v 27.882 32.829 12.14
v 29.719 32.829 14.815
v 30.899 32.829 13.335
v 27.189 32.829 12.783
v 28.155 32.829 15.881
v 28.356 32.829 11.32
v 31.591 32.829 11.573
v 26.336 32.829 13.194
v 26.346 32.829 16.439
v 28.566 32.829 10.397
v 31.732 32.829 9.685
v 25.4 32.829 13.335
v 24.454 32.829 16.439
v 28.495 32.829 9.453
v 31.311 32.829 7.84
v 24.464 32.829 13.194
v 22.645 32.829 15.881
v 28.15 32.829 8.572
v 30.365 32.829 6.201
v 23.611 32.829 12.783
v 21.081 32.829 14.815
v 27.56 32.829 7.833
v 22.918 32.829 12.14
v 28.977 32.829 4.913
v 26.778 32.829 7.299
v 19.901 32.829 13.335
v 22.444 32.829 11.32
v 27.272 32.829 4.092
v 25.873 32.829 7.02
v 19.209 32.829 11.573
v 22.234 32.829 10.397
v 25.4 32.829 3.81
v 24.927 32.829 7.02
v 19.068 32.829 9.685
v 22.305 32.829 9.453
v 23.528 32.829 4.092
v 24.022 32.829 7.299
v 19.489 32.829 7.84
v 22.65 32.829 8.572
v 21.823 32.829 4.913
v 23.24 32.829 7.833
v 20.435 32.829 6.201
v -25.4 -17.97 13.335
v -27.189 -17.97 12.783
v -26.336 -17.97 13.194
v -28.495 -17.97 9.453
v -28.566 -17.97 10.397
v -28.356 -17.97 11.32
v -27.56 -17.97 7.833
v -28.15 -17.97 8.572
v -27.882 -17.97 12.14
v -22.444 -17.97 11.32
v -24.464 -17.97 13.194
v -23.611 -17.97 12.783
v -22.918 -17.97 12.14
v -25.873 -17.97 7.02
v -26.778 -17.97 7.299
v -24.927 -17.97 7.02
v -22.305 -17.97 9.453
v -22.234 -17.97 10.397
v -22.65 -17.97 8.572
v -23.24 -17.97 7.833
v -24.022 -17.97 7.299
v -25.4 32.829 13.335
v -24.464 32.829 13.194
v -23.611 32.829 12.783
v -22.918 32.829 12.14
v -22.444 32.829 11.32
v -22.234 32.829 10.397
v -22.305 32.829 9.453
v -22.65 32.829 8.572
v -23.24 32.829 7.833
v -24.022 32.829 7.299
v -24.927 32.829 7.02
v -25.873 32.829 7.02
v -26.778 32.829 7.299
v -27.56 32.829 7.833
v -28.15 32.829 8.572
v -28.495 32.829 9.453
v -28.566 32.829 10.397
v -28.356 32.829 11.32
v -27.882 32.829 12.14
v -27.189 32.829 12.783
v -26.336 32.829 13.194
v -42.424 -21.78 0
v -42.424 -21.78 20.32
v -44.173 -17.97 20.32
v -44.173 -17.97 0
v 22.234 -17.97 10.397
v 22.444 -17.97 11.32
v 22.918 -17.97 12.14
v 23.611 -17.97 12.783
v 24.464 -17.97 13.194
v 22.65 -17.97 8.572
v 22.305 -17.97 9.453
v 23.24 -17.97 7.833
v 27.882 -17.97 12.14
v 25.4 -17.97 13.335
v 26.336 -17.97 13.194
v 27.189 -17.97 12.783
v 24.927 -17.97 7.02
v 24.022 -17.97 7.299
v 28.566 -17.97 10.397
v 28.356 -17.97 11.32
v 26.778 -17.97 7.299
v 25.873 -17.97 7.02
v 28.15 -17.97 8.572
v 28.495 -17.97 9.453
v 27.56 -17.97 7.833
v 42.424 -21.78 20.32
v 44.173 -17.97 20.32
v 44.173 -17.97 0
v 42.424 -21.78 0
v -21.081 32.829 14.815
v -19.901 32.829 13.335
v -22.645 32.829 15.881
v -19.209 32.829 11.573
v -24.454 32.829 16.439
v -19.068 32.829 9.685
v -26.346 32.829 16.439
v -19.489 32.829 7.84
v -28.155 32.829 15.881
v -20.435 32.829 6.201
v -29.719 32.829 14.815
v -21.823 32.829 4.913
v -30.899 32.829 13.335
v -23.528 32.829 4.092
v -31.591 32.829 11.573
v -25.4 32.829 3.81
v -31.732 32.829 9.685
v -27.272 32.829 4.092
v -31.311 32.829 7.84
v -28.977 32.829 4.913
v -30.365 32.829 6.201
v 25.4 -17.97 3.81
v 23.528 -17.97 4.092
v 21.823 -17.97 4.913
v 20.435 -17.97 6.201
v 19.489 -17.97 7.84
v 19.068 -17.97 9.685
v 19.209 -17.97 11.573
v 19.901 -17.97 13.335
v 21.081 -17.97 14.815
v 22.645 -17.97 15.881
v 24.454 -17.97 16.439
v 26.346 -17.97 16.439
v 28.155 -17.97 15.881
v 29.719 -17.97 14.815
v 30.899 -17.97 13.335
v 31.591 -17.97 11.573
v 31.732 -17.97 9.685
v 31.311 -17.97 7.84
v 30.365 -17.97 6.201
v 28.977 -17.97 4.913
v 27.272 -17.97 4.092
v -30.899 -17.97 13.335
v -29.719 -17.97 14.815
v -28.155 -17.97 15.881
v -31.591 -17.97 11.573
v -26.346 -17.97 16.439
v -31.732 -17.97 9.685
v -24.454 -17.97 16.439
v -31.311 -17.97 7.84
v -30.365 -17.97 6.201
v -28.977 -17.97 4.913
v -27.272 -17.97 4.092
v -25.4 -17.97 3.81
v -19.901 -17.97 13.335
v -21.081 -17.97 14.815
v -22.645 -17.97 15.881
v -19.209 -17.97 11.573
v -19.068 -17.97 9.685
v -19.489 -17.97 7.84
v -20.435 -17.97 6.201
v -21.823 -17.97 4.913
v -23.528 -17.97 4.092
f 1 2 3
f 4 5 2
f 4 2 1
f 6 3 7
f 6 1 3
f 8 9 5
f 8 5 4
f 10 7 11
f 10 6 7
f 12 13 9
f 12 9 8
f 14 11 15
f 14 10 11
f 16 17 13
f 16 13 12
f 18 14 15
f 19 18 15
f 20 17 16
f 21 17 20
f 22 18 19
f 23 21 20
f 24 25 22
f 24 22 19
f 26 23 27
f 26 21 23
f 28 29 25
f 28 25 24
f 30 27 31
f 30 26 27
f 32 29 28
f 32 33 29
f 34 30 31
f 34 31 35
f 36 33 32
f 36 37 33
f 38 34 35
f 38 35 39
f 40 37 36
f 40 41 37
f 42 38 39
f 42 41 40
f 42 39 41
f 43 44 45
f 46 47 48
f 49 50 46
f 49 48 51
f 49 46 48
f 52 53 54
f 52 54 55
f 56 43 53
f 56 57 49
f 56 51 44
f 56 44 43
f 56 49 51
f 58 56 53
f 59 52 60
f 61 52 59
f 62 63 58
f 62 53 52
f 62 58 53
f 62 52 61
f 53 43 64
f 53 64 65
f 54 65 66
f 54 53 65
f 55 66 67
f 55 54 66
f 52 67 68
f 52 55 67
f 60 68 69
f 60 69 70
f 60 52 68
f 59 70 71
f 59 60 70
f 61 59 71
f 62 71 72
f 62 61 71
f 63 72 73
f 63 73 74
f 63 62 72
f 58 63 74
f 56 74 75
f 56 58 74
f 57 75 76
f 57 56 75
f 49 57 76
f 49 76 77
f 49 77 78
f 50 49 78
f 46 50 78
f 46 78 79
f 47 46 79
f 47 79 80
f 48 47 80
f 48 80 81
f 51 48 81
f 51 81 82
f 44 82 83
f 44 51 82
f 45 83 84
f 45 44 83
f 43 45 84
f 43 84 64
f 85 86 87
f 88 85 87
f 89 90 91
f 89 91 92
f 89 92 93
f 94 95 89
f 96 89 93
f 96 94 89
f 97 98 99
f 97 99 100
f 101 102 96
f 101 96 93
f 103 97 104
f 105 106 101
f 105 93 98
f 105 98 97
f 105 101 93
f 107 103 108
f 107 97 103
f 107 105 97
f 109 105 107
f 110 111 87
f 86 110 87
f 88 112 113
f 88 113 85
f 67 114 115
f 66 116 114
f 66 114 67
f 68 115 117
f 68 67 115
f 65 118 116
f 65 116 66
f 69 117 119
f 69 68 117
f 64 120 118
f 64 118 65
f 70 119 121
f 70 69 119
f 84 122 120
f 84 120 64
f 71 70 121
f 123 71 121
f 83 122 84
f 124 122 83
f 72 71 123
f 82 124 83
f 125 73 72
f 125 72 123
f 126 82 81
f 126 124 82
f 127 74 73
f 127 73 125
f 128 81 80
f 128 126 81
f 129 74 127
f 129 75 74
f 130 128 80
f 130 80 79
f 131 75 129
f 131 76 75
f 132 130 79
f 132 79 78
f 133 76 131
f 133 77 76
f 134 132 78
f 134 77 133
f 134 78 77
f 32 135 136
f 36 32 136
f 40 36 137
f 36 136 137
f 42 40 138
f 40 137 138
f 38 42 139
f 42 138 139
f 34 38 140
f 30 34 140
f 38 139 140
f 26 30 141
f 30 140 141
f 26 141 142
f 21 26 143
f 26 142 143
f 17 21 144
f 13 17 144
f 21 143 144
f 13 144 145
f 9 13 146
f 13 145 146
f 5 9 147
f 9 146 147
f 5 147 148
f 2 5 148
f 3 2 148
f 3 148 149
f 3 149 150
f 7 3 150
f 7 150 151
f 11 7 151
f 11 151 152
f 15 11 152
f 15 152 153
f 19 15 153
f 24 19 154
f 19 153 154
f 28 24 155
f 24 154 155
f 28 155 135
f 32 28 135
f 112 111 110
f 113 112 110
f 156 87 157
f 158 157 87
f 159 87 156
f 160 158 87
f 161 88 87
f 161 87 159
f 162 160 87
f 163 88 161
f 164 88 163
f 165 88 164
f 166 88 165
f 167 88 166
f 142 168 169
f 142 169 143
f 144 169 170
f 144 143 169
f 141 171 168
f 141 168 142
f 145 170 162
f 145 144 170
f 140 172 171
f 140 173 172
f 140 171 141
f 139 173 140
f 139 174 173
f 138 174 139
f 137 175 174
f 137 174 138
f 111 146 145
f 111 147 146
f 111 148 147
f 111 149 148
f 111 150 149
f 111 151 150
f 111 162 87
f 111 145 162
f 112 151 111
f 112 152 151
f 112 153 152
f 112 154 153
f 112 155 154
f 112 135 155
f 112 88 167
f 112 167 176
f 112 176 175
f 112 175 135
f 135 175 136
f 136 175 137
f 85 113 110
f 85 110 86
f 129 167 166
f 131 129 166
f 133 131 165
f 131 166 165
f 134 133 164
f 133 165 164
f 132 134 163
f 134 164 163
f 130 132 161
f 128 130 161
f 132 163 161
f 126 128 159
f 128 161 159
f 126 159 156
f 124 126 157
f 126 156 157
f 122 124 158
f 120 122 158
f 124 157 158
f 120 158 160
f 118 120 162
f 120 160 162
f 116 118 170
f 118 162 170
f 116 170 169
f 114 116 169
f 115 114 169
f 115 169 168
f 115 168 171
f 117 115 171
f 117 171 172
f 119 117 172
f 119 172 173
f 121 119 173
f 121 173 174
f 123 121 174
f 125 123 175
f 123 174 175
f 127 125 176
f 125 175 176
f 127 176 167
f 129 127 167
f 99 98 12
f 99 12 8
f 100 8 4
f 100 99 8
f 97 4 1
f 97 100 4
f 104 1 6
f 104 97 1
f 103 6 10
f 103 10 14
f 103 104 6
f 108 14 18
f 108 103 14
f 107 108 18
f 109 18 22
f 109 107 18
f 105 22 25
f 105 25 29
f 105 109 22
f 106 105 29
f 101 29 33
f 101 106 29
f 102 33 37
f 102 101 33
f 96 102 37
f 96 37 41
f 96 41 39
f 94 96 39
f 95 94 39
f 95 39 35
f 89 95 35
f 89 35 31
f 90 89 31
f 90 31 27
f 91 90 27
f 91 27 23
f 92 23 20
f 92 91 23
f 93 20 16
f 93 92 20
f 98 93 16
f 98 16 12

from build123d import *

# Parameters (mm, degrees)
BOSS_EXTRUDE1_DEPTH = 20.32
SKETCH2_R           = 6.35
SKETCH2_R_2         = 3.175
BOSS_EXTRUDE2_DEPTH = 50.8


with BuildPart() as part:
    # Sketch1 → Boss-Extrude1 (new body)
    with BuildSketch(Plane.XY):
        Polygon((-44.173002637, -17.9705), (44.173002637, -17.9705), (42.424083396, -21.7805), (-42.424083396, -21.7805), align=None)
    extrude(amount=BOSS_EXTRUDE1_DEPTH)

    # Sketch2 → Boss-Extrude2 (add)
    # profile 1 of 2: a face of its own
    with BuildSketch(Plane(origin=(0, -17.9705, 0), x_dir=(1, 0, 0), z_dir=(0, 1, 0))):
        with Locations(Location((-25.4, -10.16, 0), (0, 0, 90))):
            Circle(SKETCH2_R)
        with Locations(Location((-25.4, -10.16, 0), (0, 0, 270))):
            Circle(SKETCH2_R_2, mode=Mode.SUBTRACT)
    # profile 2 of 2: a face of its own
    with BuildSketch(Plane(origin=(0, -17.9705, 0), x_dir=(1, 0, 0), z_dir=(0, 1, 0))):
        with Locations(Location((25.4, -10.16, 0), (0, 0, 90))):
            Circle(SKETCH2_R)
        with Locations(Location((25.4, -10.16, 0), (0, 0, 270))):
            Circle(SKETCH2_R_2, mode=Mode.SUBTRACT)
    extrude(amount=BOSS_EXTRUDE2_DEPTH)


solid = part.part
